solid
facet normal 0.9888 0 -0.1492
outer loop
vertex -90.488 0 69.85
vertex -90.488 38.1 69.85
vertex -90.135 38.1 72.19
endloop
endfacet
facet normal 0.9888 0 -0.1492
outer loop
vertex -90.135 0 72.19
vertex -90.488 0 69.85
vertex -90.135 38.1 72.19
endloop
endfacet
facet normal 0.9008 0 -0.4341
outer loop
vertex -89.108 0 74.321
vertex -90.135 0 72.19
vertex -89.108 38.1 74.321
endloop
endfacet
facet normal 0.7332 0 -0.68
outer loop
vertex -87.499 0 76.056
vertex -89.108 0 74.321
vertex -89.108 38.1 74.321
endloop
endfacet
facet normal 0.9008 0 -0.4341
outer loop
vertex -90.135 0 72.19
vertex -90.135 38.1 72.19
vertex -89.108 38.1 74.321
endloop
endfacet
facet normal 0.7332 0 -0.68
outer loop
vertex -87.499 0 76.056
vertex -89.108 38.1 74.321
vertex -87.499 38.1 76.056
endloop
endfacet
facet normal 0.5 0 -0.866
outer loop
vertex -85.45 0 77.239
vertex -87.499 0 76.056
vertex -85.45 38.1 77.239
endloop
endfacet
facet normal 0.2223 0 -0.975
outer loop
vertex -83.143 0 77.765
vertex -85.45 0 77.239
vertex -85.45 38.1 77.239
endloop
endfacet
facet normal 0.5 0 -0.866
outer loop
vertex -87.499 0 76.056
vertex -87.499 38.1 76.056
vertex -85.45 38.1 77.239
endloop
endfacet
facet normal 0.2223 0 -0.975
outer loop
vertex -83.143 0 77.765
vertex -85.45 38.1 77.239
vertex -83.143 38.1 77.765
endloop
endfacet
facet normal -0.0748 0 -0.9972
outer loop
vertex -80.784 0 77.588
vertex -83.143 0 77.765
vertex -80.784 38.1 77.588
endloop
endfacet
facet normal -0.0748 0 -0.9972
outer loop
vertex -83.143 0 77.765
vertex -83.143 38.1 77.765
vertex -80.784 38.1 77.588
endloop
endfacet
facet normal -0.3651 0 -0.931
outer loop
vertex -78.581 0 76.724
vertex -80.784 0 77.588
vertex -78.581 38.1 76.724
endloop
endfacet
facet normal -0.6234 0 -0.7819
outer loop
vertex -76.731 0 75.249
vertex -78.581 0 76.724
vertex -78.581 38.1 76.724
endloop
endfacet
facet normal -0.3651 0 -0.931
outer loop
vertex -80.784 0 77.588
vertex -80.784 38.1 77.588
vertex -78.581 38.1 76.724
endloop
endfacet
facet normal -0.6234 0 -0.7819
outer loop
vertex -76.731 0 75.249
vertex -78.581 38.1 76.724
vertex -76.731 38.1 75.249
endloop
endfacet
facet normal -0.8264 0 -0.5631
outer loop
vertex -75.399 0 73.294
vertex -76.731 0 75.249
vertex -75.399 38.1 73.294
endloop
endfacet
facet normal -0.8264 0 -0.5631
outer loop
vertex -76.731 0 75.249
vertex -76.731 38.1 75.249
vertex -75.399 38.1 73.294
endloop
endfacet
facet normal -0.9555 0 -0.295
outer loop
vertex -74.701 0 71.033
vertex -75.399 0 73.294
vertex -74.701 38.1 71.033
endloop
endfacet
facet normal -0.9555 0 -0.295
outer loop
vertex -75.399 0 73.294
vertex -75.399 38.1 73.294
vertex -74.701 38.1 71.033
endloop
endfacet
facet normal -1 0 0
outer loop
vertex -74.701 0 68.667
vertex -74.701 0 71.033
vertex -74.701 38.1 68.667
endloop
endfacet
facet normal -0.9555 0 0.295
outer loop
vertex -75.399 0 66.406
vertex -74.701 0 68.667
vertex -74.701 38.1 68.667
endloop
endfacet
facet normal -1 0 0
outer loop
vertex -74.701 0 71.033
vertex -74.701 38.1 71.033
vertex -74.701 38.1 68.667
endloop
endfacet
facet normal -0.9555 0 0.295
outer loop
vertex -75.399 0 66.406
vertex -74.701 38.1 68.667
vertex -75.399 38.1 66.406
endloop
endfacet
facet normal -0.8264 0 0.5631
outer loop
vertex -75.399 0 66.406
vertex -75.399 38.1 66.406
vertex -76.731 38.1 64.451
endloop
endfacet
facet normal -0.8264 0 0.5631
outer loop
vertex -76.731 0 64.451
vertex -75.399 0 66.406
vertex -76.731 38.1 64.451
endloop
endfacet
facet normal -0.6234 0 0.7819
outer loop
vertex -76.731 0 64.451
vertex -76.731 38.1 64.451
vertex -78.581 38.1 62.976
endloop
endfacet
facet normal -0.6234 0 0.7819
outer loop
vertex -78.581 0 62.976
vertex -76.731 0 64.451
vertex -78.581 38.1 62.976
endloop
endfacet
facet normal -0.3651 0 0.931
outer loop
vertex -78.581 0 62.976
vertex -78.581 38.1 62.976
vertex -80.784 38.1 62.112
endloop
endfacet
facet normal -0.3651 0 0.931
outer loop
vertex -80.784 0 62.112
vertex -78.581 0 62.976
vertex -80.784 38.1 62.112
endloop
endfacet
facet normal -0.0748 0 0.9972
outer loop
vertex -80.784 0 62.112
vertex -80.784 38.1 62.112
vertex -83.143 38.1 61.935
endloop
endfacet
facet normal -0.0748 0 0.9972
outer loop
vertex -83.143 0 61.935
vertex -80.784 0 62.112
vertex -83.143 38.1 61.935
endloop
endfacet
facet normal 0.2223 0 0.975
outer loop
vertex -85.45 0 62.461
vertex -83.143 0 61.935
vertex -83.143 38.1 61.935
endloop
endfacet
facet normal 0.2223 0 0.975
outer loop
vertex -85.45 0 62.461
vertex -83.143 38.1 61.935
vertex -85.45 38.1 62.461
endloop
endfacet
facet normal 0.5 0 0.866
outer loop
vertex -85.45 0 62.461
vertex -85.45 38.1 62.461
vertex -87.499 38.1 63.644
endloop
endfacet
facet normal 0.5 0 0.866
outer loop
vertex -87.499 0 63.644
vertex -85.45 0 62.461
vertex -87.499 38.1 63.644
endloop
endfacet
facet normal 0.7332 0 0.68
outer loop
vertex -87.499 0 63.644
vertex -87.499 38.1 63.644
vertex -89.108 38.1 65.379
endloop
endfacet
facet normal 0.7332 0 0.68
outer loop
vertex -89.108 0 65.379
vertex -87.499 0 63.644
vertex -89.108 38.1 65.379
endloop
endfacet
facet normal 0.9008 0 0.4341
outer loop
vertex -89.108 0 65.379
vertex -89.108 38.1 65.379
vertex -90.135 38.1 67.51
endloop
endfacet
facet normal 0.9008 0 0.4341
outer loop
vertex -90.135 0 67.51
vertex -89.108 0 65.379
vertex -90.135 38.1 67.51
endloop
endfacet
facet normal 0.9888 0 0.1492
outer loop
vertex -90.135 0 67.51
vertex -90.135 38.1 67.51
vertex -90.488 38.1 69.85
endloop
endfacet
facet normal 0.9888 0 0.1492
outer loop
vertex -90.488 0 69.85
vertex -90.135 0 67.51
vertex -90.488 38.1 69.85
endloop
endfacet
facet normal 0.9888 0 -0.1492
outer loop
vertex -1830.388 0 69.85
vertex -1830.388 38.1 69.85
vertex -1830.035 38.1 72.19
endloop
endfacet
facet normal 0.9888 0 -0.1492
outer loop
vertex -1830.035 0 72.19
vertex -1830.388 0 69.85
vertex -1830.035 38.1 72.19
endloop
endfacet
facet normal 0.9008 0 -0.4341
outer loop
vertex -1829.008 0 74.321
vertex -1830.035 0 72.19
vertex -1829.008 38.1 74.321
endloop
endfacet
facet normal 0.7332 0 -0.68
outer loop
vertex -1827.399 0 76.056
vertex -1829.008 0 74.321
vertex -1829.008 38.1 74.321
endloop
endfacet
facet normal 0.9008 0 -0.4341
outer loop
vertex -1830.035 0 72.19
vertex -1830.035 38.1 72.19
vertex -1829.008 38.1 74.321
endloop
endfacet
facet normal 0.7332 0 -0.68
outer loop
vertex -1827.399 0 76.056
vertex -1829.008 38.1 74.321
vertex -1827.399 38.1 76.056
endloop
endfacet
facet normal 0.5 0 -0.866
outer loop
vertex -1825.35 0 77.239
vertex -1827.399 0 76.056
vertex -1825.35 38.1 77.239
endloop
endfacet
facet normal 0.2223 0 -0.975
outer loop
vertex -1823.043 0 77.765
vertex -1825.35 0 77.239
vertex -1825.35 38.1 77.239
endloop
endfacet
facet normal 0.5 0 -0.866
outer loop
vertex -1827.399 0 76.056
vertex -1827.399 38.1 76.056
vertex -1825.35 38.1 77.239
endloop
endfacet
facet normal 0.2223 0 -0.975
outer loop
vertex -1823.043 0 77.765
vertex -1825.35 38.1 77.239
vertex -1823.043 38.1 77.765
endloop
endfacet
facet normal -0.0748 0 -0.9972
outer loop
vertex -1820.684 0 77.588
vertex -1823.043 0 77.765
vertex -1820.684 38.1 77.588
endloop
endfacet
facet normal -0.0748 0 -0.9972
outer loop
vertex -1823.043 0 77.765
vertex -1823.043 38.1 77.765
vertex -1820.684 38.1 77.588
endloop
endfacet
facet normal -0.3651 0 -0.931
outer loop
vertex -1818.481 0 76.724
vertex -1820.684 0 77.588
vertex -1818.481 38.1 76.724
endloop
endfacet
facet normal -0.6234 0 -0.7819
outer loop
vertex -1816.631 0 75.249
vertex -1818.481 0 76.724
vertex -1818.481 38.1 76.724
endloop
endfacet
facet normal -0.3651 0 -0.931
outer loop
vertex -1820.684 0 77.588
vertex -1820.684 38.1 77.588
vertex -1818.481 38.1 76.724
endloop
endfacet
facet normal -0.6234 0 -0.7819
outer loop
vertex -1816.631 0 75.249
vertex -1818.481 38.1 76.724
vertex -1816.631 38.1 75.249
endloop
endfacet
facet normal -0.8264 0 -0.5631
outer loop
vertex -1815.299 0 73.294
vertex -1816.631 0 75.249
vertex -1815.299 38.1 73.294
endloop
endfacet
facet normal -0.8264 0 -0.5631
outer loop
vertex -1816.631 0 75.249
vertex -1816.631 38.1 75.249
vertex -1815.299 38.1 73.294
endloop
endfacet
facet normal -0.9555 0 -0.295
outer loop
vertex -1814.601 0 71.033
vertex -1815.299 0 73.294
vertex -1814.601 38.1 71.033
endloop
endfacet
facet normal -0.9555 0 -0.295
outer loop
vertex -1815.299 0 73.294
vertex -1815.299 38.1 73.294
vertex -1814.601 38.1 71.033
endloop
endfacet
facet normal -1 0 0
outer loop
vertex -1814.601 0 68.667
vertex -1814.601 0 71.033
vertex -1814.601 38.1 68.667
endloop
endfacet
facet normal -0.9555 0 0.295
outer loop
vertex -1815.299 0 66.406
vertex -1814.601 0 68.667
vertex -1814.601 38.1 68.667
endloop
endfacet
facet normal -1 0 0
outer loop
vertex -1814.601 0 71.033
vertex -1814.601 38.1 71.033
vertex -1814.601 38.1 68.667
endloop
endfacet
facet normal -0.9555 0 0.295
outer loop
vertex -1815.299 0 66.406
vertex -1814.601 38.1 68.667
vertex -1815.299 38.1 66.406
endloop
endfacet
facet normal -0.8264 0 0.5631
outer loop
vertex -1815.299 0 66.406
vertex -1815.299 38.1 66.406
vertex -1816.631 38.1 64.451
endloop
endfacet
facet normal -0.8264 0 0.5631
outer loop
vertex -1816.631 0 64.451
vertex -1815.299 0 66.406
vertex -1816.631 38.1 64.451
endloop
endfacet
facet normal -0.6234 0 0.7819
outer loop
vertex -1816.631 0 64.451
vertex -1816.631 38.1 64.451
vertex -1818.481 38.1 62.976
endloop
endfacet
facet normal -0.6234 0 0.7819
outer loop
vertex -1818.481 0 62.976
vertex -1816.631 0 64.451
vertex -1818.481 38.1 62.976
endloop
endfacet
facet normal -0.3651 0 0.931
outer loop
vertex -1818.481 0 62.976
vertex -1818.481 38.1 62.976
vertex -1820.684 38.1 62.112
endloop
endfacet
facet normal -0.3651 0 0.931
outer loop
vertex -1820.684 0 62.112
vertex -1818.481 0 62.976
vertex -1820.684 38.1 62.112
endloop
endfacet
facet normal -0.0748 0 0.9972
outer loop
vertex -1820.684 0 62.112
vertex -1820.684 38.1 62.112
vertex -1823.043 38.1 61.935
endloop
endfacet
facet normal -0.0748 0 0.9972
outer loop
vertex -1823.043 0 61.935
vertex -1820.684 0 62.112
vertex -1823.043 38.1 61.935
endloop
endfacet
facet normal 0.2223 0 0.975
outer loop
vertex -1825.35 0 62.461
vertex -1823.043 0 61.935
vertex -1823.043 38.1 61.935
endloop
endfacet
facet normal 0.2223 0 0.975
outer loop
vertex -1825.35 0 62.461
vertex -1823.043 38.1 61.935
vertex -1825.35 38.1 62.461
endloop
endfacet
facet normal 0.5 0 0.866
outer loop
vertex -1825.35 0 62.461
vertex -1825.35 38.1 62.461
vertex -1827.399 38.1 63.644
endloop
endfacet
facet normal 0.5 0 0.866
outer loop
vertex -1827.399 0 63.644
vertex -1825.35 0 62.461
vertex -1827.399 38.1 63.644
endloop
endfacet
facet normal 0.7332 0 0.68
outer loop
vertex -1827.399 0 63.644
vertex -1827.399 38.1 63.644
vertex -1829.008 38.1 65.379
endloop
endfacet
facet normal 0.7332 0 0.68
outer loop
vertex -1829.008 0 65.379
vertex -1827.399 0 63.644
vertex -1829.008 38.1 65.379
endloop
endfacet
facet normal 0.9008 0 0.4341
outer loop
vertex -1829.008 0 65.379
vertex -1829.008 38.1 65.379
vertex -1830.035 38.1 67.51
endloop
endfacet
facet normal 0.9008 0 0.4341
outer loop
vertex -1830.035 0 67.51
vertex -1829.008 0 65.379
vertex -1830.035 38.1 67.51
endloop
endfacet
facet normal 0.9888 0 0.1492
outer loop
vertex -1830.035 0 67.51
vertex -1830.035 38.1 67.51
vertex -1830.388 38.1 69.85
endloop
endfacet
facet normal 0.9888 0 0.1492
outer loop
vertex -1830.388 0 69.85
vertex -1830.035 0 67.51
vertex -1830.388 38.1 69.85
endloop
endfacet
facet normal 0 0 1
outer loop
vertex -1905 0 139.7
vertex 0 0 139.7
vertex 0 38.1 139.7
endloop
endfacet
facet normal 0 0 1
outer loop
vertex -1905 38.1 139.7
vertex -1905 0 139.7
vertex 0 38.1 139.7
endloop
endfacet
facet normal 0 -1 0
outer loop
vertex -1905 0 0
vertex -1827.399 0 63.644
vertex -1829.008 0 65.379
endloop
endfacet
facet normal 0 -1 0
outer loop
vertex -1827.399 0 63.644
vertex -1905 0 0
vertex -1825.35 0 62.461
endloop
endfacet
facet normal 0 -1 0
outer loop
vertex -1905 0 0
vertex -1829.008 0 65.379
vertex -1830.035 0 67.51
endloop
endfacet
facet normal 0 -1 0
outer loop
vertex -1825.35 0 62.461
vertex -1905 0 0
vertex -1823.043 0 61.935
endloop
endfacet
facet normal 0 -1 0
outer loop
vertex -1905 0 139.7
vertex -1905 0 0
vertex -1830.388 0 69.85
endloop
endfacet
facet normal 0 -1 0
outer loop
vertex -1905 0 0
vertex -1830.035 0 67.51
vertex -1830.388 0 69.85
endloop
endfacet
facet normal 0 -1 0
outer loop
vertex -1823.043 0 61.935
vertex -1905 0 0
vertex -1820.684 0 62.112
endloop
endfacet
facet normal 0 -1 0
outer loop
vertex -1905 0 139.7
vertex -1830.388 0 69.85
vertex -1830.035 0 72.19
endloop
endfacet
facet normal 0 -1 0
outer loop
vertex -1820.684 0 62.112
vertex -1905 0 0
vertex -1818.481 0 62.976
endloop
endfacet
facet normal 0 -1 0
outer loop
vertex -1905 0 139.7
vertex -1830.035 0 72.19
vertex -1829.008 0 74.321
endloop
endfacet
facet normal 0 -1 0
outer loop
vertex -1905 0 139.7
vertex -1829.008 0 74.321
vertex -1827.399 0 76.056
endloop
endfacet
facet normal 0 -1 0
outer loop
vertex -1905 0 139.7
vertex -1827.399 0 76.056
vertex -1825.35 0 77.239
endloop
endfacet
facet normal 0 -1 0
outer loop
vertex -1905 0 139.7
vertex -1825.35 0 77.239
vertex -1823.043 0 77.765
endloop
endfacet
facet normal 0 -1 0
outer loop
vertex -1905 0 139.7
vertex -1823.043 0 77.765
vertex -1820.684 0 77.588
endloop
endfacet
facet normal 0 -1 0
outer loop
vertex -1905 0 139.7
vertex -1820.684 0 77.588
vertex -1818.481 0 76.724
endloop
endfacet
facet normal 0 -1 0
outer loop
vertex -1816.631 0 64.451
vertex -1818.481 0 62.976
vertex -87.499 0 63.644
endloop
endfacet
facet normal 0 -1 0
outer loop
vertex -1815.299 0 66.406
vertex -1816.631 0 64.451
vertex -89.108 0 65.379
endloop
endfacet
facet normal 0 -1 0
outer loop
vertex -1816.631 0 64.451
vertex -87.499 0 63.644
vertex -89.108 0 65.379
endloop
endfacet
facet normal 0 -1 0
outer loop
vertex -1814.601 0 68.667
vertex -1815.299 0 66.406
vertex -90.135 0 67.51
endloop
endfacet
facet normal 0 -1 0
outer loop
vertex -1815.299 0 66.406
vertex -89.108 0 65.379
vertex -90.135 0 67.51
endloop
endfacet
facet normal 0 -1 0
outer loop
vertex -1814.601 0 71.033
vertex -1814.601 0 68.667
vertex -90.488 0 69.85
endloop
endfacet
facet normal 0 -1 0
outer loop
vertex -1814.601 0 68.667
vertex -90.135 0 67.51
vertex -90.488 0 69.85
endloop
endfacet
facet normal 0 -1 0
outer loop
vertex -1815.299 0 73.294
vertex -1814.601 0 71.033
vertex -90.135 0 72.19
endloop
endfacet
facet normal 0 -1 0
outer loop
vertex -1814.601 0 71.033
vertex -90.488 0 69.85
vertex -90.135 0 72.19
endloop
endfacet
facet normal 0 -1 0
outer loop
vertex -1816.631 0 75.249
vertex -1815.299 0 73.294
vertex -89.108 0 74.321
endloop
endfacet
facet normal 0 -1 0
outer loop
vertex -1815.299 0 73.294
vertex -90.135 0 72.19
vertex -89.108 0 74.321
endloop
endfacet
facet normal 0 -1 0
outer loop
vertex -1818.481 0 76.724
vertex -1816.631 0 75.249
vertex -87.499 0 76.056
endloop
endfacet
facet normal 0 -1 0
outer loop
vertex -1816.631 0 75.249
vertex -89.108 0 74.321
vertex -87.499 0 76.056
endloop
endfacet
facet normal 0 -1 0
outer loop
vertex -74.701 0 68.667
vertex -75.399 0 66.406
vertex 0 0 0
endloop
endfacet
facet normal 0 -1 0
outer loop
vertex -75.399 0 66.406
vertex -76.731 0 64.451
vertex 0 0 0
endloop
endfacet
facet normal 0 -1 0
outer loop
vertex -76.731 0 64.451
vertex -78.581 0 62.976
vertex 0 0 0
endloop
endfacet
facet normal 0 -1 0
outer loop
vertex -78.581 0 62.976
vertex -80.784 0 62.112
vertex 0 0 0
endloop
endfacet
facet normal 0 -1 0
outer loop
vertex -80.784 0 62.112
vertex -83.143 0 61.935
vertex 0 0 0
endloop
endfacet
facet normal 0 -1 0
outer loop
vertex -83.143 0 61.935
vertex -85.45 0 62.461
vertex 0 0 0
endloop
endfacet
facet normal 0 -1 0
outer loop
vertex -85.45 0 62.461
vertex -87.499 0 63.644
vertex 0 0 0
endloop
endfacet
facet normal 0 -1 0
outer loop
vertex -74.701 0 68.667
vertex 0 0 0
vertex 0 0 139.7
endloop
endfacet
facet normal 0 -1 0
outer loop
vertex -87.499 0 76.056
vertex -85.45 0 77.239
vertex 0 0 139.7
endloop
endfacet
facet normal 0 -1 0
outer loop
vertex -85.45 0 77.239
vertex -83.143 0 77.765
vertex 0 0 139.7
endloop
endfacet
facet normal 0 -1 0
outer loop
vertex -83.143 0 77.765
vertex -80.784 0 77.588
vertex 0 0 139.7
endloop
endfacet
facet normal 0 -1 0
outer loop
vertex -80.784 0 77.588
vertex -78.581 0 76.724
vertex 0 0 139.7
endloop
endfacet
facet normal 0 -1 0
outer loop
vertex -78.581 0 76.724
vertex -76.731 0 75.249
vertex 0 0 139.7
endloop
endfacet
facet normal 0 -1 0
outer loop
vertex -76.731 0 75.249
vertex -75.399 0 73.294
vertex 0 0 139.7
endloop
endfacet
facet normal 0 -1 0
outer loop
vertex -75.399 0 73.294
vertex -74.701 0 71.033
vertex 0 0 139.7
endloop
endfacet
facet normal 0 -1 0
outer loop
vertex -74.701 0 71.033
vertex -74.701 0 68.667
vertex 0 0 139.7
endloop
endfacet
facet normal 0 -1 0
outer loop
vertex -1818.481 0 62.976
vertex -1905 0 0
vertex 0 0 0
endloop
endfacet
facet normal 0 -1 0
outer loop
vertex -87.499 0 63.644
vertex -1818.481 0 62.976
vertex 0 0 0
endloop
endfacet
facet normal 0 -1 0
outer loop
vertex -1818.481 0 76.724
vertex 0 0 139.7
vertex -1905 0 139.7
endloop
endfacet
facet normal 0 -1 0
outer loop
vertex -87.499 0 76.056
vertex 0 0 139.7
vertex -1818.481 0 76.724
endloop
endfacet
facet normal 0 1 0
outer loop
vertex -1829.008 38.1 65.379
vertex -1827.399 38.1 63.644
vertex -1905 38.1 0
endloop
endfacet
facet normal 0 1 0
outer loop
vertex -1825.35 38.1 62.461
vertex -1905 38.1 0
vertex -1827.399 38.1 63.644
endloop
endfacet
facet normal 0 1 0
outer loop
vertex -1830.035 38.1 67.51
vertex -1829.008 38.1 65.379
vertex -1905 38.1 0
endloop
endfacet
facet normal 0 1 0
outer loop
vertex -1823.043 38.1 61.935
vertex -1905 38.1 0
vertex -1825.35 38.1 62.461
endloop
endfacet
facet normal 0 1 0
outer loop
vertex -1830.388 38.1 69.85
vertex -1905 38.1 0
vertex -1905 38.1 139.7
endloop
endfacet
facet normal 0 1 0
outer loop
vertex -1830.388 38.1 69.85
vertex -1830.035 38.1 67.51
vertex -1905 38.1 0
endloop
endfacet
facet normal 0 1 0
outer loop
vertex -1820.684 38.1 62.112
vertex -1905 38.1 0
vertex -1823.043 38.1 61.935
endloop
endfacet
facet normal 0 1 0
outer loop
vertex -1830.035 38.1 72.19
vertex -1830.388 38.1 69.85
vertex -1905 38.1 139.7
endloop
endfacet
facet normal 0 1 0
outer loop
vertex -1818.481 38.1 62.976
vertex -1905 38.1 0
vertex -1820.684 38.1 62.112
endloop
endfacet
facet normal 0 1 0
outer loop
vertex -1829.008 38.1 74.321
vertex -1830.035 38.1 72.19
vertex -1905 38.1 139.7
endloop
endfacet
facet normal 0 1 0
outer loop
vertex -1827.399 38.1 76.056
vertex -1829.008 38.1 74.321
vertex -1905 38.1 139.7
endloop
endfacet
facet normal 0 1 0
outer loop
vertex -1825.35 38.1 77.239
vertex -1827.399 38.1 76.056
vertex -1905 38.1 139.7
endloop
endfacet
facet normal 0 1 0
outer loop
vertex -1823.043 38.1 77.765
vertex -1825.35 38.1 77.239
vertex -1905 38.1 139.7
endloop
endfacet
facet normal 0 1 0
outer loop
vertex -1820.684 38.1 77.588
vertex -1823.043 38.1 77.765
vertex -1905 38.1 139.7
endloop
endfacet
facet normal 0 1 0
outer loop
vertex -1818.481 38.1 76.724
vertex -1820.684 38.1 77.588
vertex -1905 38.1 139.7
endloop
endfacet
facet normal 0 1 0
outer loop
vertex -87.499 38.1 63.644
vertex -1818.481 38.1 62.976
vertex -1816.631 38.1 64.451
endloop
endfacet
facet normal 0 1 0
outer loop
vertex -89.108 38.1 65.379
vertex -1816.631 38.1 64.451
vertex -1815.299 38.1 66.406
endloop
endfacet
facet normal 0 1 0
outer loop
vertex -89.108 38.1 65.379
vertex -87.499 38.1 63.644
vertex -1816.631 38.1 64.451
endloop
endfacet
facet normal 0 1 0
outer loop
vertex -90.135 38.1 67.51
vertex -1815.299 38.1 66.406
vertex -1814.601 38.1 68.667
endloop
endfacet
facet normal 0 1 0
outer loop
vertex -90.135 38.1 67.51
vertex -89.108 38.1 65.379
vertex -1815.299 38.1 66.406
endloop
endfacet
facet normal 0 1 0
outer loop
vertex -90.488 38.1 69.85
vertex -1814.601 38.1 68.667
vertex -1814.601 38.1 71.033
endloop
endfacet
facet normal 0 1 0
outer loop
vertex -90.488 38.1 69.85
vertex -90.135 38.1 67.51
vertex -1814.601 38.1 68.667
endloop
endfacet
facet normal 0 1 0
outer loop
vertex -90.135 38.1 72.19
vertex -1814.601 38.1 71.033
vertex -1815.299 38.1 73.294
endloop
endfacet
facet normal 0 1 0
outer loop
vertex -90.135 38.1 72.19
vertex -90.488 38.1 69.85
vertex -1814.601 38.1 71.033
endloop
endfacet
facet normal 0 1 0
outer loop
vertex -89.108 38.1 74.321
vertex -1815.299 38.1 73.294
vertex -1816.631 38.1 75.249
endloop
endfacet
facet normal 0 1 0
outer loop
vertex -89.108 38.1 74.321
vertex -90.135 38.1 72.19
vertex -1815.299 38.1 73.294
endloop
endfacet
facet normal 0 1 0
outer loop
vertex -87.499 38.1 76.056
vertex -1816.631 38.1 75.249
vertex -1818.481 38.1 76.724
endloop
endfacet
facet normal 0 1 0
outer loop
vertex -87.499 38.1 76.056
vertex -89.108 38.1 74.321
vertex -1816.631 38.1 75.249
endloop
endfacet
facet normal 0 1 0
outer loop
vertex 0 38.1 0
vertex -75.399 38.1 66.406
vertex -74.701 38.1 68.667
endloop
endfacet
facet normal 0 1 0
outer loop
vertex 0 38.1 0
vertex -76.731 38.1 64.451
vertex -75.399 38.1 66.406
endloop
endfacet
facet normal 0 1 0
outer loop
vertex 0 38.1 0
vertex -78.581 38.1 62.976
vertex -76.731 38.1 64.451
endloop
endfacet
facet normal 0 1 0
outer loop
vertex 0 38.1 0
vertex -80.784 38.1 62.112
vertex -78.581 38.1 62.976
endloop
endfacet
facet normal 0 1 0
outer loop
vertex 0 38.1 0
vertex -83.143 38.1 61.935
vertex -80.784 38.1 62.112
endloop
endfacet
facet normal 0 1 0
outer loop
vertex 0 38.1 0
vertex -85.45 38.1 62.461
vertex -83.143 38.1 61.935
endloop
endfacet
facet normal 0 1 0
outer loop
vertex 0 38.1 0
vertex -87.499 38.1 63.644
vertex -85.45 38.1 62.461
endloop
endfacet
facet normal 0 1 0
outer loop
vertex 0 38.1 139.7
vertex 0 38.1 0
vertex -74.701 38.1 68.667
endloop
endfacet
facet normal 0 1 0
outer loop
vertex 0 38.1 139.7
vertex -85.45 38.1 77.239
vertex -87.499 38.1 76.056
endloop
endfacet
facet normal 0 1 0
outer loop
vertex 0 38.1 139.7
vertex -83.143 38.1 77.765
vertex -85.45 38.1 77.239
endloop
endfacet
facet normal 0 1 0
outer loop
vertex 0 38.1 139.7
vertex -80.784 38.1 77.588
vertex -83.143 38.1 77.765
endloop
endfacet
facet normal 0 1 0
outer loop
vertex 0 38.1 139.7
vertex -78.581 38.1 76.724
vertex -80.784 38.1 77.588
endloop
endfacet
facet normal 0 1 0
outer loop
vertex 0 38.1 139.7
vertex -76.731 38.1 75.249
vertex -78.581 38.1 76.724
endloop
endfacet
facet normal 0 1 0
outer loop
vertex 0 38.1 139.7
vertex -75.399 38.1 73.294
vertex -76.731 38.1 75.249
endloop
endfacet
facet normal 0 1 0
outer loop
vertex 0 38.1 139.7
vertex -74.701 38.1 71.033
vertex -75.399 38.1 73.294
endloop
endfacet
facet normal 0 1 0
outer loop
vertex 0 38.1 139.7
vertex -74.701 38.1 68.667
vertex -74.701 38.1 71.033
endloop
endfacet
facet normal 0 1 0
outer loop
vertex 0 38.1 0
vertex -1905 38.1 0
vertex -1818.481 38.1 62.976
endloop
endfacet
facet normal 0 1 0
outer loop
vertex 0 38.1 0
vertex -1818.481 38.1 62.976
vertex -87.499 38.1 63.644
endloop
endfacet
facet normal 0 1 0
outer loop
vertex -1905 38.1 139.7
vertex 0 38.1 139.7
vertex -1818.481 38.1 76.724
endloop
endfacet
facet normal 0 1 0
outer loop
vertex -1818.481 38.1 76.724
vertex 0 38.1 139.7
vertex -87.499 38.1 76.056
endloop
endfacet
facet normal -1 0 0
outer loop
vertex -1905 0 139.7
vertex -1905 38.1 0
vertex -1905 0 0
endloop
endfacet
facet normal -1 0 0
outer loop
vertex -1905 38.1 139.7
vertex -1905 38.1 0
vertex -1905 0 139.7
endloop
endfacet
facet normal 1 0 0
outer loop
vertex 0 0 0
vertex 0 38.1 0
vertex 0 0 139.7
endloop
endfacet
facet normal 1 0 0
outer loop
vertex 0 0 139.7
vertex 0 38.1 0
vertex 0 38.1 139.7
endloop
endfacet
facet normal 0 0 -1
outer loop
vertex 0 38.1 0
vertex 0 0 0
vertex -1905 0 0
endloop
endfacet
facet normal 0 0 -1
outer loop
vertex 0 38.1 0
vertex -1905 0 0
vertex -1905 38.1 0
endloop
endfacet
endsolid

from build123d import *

# Parameters (mm, degrees)
F0_W     = 139.7
F0_H     = 38.1
F1_DEPTH = 1905
F2_ANGLE = 90
F4_D     = 15.875


with BuildPart() as f1:
    # F0 (on Top) → F1 (new body)
    with BuildSketch(Plane.XY):
        with Locations((69.85, 19.05)):
            Rectangle(F0_W, F0_H)
    extrude(amount=F1_DEPTH)


with BuildPart() as f1_1:
    # F2: moved
    add(f1.part.rotate(Axis((0, 19.05, 0), (0, -1, 0)), F2_ANGLE))

    # F4 (through all)
    with Locations(Plane.XZ):
        with Locations((-82.55, 69.85), (-1822.45, 69.85)):
            Hole(F4_D / 2)


solid = f1_1.part
